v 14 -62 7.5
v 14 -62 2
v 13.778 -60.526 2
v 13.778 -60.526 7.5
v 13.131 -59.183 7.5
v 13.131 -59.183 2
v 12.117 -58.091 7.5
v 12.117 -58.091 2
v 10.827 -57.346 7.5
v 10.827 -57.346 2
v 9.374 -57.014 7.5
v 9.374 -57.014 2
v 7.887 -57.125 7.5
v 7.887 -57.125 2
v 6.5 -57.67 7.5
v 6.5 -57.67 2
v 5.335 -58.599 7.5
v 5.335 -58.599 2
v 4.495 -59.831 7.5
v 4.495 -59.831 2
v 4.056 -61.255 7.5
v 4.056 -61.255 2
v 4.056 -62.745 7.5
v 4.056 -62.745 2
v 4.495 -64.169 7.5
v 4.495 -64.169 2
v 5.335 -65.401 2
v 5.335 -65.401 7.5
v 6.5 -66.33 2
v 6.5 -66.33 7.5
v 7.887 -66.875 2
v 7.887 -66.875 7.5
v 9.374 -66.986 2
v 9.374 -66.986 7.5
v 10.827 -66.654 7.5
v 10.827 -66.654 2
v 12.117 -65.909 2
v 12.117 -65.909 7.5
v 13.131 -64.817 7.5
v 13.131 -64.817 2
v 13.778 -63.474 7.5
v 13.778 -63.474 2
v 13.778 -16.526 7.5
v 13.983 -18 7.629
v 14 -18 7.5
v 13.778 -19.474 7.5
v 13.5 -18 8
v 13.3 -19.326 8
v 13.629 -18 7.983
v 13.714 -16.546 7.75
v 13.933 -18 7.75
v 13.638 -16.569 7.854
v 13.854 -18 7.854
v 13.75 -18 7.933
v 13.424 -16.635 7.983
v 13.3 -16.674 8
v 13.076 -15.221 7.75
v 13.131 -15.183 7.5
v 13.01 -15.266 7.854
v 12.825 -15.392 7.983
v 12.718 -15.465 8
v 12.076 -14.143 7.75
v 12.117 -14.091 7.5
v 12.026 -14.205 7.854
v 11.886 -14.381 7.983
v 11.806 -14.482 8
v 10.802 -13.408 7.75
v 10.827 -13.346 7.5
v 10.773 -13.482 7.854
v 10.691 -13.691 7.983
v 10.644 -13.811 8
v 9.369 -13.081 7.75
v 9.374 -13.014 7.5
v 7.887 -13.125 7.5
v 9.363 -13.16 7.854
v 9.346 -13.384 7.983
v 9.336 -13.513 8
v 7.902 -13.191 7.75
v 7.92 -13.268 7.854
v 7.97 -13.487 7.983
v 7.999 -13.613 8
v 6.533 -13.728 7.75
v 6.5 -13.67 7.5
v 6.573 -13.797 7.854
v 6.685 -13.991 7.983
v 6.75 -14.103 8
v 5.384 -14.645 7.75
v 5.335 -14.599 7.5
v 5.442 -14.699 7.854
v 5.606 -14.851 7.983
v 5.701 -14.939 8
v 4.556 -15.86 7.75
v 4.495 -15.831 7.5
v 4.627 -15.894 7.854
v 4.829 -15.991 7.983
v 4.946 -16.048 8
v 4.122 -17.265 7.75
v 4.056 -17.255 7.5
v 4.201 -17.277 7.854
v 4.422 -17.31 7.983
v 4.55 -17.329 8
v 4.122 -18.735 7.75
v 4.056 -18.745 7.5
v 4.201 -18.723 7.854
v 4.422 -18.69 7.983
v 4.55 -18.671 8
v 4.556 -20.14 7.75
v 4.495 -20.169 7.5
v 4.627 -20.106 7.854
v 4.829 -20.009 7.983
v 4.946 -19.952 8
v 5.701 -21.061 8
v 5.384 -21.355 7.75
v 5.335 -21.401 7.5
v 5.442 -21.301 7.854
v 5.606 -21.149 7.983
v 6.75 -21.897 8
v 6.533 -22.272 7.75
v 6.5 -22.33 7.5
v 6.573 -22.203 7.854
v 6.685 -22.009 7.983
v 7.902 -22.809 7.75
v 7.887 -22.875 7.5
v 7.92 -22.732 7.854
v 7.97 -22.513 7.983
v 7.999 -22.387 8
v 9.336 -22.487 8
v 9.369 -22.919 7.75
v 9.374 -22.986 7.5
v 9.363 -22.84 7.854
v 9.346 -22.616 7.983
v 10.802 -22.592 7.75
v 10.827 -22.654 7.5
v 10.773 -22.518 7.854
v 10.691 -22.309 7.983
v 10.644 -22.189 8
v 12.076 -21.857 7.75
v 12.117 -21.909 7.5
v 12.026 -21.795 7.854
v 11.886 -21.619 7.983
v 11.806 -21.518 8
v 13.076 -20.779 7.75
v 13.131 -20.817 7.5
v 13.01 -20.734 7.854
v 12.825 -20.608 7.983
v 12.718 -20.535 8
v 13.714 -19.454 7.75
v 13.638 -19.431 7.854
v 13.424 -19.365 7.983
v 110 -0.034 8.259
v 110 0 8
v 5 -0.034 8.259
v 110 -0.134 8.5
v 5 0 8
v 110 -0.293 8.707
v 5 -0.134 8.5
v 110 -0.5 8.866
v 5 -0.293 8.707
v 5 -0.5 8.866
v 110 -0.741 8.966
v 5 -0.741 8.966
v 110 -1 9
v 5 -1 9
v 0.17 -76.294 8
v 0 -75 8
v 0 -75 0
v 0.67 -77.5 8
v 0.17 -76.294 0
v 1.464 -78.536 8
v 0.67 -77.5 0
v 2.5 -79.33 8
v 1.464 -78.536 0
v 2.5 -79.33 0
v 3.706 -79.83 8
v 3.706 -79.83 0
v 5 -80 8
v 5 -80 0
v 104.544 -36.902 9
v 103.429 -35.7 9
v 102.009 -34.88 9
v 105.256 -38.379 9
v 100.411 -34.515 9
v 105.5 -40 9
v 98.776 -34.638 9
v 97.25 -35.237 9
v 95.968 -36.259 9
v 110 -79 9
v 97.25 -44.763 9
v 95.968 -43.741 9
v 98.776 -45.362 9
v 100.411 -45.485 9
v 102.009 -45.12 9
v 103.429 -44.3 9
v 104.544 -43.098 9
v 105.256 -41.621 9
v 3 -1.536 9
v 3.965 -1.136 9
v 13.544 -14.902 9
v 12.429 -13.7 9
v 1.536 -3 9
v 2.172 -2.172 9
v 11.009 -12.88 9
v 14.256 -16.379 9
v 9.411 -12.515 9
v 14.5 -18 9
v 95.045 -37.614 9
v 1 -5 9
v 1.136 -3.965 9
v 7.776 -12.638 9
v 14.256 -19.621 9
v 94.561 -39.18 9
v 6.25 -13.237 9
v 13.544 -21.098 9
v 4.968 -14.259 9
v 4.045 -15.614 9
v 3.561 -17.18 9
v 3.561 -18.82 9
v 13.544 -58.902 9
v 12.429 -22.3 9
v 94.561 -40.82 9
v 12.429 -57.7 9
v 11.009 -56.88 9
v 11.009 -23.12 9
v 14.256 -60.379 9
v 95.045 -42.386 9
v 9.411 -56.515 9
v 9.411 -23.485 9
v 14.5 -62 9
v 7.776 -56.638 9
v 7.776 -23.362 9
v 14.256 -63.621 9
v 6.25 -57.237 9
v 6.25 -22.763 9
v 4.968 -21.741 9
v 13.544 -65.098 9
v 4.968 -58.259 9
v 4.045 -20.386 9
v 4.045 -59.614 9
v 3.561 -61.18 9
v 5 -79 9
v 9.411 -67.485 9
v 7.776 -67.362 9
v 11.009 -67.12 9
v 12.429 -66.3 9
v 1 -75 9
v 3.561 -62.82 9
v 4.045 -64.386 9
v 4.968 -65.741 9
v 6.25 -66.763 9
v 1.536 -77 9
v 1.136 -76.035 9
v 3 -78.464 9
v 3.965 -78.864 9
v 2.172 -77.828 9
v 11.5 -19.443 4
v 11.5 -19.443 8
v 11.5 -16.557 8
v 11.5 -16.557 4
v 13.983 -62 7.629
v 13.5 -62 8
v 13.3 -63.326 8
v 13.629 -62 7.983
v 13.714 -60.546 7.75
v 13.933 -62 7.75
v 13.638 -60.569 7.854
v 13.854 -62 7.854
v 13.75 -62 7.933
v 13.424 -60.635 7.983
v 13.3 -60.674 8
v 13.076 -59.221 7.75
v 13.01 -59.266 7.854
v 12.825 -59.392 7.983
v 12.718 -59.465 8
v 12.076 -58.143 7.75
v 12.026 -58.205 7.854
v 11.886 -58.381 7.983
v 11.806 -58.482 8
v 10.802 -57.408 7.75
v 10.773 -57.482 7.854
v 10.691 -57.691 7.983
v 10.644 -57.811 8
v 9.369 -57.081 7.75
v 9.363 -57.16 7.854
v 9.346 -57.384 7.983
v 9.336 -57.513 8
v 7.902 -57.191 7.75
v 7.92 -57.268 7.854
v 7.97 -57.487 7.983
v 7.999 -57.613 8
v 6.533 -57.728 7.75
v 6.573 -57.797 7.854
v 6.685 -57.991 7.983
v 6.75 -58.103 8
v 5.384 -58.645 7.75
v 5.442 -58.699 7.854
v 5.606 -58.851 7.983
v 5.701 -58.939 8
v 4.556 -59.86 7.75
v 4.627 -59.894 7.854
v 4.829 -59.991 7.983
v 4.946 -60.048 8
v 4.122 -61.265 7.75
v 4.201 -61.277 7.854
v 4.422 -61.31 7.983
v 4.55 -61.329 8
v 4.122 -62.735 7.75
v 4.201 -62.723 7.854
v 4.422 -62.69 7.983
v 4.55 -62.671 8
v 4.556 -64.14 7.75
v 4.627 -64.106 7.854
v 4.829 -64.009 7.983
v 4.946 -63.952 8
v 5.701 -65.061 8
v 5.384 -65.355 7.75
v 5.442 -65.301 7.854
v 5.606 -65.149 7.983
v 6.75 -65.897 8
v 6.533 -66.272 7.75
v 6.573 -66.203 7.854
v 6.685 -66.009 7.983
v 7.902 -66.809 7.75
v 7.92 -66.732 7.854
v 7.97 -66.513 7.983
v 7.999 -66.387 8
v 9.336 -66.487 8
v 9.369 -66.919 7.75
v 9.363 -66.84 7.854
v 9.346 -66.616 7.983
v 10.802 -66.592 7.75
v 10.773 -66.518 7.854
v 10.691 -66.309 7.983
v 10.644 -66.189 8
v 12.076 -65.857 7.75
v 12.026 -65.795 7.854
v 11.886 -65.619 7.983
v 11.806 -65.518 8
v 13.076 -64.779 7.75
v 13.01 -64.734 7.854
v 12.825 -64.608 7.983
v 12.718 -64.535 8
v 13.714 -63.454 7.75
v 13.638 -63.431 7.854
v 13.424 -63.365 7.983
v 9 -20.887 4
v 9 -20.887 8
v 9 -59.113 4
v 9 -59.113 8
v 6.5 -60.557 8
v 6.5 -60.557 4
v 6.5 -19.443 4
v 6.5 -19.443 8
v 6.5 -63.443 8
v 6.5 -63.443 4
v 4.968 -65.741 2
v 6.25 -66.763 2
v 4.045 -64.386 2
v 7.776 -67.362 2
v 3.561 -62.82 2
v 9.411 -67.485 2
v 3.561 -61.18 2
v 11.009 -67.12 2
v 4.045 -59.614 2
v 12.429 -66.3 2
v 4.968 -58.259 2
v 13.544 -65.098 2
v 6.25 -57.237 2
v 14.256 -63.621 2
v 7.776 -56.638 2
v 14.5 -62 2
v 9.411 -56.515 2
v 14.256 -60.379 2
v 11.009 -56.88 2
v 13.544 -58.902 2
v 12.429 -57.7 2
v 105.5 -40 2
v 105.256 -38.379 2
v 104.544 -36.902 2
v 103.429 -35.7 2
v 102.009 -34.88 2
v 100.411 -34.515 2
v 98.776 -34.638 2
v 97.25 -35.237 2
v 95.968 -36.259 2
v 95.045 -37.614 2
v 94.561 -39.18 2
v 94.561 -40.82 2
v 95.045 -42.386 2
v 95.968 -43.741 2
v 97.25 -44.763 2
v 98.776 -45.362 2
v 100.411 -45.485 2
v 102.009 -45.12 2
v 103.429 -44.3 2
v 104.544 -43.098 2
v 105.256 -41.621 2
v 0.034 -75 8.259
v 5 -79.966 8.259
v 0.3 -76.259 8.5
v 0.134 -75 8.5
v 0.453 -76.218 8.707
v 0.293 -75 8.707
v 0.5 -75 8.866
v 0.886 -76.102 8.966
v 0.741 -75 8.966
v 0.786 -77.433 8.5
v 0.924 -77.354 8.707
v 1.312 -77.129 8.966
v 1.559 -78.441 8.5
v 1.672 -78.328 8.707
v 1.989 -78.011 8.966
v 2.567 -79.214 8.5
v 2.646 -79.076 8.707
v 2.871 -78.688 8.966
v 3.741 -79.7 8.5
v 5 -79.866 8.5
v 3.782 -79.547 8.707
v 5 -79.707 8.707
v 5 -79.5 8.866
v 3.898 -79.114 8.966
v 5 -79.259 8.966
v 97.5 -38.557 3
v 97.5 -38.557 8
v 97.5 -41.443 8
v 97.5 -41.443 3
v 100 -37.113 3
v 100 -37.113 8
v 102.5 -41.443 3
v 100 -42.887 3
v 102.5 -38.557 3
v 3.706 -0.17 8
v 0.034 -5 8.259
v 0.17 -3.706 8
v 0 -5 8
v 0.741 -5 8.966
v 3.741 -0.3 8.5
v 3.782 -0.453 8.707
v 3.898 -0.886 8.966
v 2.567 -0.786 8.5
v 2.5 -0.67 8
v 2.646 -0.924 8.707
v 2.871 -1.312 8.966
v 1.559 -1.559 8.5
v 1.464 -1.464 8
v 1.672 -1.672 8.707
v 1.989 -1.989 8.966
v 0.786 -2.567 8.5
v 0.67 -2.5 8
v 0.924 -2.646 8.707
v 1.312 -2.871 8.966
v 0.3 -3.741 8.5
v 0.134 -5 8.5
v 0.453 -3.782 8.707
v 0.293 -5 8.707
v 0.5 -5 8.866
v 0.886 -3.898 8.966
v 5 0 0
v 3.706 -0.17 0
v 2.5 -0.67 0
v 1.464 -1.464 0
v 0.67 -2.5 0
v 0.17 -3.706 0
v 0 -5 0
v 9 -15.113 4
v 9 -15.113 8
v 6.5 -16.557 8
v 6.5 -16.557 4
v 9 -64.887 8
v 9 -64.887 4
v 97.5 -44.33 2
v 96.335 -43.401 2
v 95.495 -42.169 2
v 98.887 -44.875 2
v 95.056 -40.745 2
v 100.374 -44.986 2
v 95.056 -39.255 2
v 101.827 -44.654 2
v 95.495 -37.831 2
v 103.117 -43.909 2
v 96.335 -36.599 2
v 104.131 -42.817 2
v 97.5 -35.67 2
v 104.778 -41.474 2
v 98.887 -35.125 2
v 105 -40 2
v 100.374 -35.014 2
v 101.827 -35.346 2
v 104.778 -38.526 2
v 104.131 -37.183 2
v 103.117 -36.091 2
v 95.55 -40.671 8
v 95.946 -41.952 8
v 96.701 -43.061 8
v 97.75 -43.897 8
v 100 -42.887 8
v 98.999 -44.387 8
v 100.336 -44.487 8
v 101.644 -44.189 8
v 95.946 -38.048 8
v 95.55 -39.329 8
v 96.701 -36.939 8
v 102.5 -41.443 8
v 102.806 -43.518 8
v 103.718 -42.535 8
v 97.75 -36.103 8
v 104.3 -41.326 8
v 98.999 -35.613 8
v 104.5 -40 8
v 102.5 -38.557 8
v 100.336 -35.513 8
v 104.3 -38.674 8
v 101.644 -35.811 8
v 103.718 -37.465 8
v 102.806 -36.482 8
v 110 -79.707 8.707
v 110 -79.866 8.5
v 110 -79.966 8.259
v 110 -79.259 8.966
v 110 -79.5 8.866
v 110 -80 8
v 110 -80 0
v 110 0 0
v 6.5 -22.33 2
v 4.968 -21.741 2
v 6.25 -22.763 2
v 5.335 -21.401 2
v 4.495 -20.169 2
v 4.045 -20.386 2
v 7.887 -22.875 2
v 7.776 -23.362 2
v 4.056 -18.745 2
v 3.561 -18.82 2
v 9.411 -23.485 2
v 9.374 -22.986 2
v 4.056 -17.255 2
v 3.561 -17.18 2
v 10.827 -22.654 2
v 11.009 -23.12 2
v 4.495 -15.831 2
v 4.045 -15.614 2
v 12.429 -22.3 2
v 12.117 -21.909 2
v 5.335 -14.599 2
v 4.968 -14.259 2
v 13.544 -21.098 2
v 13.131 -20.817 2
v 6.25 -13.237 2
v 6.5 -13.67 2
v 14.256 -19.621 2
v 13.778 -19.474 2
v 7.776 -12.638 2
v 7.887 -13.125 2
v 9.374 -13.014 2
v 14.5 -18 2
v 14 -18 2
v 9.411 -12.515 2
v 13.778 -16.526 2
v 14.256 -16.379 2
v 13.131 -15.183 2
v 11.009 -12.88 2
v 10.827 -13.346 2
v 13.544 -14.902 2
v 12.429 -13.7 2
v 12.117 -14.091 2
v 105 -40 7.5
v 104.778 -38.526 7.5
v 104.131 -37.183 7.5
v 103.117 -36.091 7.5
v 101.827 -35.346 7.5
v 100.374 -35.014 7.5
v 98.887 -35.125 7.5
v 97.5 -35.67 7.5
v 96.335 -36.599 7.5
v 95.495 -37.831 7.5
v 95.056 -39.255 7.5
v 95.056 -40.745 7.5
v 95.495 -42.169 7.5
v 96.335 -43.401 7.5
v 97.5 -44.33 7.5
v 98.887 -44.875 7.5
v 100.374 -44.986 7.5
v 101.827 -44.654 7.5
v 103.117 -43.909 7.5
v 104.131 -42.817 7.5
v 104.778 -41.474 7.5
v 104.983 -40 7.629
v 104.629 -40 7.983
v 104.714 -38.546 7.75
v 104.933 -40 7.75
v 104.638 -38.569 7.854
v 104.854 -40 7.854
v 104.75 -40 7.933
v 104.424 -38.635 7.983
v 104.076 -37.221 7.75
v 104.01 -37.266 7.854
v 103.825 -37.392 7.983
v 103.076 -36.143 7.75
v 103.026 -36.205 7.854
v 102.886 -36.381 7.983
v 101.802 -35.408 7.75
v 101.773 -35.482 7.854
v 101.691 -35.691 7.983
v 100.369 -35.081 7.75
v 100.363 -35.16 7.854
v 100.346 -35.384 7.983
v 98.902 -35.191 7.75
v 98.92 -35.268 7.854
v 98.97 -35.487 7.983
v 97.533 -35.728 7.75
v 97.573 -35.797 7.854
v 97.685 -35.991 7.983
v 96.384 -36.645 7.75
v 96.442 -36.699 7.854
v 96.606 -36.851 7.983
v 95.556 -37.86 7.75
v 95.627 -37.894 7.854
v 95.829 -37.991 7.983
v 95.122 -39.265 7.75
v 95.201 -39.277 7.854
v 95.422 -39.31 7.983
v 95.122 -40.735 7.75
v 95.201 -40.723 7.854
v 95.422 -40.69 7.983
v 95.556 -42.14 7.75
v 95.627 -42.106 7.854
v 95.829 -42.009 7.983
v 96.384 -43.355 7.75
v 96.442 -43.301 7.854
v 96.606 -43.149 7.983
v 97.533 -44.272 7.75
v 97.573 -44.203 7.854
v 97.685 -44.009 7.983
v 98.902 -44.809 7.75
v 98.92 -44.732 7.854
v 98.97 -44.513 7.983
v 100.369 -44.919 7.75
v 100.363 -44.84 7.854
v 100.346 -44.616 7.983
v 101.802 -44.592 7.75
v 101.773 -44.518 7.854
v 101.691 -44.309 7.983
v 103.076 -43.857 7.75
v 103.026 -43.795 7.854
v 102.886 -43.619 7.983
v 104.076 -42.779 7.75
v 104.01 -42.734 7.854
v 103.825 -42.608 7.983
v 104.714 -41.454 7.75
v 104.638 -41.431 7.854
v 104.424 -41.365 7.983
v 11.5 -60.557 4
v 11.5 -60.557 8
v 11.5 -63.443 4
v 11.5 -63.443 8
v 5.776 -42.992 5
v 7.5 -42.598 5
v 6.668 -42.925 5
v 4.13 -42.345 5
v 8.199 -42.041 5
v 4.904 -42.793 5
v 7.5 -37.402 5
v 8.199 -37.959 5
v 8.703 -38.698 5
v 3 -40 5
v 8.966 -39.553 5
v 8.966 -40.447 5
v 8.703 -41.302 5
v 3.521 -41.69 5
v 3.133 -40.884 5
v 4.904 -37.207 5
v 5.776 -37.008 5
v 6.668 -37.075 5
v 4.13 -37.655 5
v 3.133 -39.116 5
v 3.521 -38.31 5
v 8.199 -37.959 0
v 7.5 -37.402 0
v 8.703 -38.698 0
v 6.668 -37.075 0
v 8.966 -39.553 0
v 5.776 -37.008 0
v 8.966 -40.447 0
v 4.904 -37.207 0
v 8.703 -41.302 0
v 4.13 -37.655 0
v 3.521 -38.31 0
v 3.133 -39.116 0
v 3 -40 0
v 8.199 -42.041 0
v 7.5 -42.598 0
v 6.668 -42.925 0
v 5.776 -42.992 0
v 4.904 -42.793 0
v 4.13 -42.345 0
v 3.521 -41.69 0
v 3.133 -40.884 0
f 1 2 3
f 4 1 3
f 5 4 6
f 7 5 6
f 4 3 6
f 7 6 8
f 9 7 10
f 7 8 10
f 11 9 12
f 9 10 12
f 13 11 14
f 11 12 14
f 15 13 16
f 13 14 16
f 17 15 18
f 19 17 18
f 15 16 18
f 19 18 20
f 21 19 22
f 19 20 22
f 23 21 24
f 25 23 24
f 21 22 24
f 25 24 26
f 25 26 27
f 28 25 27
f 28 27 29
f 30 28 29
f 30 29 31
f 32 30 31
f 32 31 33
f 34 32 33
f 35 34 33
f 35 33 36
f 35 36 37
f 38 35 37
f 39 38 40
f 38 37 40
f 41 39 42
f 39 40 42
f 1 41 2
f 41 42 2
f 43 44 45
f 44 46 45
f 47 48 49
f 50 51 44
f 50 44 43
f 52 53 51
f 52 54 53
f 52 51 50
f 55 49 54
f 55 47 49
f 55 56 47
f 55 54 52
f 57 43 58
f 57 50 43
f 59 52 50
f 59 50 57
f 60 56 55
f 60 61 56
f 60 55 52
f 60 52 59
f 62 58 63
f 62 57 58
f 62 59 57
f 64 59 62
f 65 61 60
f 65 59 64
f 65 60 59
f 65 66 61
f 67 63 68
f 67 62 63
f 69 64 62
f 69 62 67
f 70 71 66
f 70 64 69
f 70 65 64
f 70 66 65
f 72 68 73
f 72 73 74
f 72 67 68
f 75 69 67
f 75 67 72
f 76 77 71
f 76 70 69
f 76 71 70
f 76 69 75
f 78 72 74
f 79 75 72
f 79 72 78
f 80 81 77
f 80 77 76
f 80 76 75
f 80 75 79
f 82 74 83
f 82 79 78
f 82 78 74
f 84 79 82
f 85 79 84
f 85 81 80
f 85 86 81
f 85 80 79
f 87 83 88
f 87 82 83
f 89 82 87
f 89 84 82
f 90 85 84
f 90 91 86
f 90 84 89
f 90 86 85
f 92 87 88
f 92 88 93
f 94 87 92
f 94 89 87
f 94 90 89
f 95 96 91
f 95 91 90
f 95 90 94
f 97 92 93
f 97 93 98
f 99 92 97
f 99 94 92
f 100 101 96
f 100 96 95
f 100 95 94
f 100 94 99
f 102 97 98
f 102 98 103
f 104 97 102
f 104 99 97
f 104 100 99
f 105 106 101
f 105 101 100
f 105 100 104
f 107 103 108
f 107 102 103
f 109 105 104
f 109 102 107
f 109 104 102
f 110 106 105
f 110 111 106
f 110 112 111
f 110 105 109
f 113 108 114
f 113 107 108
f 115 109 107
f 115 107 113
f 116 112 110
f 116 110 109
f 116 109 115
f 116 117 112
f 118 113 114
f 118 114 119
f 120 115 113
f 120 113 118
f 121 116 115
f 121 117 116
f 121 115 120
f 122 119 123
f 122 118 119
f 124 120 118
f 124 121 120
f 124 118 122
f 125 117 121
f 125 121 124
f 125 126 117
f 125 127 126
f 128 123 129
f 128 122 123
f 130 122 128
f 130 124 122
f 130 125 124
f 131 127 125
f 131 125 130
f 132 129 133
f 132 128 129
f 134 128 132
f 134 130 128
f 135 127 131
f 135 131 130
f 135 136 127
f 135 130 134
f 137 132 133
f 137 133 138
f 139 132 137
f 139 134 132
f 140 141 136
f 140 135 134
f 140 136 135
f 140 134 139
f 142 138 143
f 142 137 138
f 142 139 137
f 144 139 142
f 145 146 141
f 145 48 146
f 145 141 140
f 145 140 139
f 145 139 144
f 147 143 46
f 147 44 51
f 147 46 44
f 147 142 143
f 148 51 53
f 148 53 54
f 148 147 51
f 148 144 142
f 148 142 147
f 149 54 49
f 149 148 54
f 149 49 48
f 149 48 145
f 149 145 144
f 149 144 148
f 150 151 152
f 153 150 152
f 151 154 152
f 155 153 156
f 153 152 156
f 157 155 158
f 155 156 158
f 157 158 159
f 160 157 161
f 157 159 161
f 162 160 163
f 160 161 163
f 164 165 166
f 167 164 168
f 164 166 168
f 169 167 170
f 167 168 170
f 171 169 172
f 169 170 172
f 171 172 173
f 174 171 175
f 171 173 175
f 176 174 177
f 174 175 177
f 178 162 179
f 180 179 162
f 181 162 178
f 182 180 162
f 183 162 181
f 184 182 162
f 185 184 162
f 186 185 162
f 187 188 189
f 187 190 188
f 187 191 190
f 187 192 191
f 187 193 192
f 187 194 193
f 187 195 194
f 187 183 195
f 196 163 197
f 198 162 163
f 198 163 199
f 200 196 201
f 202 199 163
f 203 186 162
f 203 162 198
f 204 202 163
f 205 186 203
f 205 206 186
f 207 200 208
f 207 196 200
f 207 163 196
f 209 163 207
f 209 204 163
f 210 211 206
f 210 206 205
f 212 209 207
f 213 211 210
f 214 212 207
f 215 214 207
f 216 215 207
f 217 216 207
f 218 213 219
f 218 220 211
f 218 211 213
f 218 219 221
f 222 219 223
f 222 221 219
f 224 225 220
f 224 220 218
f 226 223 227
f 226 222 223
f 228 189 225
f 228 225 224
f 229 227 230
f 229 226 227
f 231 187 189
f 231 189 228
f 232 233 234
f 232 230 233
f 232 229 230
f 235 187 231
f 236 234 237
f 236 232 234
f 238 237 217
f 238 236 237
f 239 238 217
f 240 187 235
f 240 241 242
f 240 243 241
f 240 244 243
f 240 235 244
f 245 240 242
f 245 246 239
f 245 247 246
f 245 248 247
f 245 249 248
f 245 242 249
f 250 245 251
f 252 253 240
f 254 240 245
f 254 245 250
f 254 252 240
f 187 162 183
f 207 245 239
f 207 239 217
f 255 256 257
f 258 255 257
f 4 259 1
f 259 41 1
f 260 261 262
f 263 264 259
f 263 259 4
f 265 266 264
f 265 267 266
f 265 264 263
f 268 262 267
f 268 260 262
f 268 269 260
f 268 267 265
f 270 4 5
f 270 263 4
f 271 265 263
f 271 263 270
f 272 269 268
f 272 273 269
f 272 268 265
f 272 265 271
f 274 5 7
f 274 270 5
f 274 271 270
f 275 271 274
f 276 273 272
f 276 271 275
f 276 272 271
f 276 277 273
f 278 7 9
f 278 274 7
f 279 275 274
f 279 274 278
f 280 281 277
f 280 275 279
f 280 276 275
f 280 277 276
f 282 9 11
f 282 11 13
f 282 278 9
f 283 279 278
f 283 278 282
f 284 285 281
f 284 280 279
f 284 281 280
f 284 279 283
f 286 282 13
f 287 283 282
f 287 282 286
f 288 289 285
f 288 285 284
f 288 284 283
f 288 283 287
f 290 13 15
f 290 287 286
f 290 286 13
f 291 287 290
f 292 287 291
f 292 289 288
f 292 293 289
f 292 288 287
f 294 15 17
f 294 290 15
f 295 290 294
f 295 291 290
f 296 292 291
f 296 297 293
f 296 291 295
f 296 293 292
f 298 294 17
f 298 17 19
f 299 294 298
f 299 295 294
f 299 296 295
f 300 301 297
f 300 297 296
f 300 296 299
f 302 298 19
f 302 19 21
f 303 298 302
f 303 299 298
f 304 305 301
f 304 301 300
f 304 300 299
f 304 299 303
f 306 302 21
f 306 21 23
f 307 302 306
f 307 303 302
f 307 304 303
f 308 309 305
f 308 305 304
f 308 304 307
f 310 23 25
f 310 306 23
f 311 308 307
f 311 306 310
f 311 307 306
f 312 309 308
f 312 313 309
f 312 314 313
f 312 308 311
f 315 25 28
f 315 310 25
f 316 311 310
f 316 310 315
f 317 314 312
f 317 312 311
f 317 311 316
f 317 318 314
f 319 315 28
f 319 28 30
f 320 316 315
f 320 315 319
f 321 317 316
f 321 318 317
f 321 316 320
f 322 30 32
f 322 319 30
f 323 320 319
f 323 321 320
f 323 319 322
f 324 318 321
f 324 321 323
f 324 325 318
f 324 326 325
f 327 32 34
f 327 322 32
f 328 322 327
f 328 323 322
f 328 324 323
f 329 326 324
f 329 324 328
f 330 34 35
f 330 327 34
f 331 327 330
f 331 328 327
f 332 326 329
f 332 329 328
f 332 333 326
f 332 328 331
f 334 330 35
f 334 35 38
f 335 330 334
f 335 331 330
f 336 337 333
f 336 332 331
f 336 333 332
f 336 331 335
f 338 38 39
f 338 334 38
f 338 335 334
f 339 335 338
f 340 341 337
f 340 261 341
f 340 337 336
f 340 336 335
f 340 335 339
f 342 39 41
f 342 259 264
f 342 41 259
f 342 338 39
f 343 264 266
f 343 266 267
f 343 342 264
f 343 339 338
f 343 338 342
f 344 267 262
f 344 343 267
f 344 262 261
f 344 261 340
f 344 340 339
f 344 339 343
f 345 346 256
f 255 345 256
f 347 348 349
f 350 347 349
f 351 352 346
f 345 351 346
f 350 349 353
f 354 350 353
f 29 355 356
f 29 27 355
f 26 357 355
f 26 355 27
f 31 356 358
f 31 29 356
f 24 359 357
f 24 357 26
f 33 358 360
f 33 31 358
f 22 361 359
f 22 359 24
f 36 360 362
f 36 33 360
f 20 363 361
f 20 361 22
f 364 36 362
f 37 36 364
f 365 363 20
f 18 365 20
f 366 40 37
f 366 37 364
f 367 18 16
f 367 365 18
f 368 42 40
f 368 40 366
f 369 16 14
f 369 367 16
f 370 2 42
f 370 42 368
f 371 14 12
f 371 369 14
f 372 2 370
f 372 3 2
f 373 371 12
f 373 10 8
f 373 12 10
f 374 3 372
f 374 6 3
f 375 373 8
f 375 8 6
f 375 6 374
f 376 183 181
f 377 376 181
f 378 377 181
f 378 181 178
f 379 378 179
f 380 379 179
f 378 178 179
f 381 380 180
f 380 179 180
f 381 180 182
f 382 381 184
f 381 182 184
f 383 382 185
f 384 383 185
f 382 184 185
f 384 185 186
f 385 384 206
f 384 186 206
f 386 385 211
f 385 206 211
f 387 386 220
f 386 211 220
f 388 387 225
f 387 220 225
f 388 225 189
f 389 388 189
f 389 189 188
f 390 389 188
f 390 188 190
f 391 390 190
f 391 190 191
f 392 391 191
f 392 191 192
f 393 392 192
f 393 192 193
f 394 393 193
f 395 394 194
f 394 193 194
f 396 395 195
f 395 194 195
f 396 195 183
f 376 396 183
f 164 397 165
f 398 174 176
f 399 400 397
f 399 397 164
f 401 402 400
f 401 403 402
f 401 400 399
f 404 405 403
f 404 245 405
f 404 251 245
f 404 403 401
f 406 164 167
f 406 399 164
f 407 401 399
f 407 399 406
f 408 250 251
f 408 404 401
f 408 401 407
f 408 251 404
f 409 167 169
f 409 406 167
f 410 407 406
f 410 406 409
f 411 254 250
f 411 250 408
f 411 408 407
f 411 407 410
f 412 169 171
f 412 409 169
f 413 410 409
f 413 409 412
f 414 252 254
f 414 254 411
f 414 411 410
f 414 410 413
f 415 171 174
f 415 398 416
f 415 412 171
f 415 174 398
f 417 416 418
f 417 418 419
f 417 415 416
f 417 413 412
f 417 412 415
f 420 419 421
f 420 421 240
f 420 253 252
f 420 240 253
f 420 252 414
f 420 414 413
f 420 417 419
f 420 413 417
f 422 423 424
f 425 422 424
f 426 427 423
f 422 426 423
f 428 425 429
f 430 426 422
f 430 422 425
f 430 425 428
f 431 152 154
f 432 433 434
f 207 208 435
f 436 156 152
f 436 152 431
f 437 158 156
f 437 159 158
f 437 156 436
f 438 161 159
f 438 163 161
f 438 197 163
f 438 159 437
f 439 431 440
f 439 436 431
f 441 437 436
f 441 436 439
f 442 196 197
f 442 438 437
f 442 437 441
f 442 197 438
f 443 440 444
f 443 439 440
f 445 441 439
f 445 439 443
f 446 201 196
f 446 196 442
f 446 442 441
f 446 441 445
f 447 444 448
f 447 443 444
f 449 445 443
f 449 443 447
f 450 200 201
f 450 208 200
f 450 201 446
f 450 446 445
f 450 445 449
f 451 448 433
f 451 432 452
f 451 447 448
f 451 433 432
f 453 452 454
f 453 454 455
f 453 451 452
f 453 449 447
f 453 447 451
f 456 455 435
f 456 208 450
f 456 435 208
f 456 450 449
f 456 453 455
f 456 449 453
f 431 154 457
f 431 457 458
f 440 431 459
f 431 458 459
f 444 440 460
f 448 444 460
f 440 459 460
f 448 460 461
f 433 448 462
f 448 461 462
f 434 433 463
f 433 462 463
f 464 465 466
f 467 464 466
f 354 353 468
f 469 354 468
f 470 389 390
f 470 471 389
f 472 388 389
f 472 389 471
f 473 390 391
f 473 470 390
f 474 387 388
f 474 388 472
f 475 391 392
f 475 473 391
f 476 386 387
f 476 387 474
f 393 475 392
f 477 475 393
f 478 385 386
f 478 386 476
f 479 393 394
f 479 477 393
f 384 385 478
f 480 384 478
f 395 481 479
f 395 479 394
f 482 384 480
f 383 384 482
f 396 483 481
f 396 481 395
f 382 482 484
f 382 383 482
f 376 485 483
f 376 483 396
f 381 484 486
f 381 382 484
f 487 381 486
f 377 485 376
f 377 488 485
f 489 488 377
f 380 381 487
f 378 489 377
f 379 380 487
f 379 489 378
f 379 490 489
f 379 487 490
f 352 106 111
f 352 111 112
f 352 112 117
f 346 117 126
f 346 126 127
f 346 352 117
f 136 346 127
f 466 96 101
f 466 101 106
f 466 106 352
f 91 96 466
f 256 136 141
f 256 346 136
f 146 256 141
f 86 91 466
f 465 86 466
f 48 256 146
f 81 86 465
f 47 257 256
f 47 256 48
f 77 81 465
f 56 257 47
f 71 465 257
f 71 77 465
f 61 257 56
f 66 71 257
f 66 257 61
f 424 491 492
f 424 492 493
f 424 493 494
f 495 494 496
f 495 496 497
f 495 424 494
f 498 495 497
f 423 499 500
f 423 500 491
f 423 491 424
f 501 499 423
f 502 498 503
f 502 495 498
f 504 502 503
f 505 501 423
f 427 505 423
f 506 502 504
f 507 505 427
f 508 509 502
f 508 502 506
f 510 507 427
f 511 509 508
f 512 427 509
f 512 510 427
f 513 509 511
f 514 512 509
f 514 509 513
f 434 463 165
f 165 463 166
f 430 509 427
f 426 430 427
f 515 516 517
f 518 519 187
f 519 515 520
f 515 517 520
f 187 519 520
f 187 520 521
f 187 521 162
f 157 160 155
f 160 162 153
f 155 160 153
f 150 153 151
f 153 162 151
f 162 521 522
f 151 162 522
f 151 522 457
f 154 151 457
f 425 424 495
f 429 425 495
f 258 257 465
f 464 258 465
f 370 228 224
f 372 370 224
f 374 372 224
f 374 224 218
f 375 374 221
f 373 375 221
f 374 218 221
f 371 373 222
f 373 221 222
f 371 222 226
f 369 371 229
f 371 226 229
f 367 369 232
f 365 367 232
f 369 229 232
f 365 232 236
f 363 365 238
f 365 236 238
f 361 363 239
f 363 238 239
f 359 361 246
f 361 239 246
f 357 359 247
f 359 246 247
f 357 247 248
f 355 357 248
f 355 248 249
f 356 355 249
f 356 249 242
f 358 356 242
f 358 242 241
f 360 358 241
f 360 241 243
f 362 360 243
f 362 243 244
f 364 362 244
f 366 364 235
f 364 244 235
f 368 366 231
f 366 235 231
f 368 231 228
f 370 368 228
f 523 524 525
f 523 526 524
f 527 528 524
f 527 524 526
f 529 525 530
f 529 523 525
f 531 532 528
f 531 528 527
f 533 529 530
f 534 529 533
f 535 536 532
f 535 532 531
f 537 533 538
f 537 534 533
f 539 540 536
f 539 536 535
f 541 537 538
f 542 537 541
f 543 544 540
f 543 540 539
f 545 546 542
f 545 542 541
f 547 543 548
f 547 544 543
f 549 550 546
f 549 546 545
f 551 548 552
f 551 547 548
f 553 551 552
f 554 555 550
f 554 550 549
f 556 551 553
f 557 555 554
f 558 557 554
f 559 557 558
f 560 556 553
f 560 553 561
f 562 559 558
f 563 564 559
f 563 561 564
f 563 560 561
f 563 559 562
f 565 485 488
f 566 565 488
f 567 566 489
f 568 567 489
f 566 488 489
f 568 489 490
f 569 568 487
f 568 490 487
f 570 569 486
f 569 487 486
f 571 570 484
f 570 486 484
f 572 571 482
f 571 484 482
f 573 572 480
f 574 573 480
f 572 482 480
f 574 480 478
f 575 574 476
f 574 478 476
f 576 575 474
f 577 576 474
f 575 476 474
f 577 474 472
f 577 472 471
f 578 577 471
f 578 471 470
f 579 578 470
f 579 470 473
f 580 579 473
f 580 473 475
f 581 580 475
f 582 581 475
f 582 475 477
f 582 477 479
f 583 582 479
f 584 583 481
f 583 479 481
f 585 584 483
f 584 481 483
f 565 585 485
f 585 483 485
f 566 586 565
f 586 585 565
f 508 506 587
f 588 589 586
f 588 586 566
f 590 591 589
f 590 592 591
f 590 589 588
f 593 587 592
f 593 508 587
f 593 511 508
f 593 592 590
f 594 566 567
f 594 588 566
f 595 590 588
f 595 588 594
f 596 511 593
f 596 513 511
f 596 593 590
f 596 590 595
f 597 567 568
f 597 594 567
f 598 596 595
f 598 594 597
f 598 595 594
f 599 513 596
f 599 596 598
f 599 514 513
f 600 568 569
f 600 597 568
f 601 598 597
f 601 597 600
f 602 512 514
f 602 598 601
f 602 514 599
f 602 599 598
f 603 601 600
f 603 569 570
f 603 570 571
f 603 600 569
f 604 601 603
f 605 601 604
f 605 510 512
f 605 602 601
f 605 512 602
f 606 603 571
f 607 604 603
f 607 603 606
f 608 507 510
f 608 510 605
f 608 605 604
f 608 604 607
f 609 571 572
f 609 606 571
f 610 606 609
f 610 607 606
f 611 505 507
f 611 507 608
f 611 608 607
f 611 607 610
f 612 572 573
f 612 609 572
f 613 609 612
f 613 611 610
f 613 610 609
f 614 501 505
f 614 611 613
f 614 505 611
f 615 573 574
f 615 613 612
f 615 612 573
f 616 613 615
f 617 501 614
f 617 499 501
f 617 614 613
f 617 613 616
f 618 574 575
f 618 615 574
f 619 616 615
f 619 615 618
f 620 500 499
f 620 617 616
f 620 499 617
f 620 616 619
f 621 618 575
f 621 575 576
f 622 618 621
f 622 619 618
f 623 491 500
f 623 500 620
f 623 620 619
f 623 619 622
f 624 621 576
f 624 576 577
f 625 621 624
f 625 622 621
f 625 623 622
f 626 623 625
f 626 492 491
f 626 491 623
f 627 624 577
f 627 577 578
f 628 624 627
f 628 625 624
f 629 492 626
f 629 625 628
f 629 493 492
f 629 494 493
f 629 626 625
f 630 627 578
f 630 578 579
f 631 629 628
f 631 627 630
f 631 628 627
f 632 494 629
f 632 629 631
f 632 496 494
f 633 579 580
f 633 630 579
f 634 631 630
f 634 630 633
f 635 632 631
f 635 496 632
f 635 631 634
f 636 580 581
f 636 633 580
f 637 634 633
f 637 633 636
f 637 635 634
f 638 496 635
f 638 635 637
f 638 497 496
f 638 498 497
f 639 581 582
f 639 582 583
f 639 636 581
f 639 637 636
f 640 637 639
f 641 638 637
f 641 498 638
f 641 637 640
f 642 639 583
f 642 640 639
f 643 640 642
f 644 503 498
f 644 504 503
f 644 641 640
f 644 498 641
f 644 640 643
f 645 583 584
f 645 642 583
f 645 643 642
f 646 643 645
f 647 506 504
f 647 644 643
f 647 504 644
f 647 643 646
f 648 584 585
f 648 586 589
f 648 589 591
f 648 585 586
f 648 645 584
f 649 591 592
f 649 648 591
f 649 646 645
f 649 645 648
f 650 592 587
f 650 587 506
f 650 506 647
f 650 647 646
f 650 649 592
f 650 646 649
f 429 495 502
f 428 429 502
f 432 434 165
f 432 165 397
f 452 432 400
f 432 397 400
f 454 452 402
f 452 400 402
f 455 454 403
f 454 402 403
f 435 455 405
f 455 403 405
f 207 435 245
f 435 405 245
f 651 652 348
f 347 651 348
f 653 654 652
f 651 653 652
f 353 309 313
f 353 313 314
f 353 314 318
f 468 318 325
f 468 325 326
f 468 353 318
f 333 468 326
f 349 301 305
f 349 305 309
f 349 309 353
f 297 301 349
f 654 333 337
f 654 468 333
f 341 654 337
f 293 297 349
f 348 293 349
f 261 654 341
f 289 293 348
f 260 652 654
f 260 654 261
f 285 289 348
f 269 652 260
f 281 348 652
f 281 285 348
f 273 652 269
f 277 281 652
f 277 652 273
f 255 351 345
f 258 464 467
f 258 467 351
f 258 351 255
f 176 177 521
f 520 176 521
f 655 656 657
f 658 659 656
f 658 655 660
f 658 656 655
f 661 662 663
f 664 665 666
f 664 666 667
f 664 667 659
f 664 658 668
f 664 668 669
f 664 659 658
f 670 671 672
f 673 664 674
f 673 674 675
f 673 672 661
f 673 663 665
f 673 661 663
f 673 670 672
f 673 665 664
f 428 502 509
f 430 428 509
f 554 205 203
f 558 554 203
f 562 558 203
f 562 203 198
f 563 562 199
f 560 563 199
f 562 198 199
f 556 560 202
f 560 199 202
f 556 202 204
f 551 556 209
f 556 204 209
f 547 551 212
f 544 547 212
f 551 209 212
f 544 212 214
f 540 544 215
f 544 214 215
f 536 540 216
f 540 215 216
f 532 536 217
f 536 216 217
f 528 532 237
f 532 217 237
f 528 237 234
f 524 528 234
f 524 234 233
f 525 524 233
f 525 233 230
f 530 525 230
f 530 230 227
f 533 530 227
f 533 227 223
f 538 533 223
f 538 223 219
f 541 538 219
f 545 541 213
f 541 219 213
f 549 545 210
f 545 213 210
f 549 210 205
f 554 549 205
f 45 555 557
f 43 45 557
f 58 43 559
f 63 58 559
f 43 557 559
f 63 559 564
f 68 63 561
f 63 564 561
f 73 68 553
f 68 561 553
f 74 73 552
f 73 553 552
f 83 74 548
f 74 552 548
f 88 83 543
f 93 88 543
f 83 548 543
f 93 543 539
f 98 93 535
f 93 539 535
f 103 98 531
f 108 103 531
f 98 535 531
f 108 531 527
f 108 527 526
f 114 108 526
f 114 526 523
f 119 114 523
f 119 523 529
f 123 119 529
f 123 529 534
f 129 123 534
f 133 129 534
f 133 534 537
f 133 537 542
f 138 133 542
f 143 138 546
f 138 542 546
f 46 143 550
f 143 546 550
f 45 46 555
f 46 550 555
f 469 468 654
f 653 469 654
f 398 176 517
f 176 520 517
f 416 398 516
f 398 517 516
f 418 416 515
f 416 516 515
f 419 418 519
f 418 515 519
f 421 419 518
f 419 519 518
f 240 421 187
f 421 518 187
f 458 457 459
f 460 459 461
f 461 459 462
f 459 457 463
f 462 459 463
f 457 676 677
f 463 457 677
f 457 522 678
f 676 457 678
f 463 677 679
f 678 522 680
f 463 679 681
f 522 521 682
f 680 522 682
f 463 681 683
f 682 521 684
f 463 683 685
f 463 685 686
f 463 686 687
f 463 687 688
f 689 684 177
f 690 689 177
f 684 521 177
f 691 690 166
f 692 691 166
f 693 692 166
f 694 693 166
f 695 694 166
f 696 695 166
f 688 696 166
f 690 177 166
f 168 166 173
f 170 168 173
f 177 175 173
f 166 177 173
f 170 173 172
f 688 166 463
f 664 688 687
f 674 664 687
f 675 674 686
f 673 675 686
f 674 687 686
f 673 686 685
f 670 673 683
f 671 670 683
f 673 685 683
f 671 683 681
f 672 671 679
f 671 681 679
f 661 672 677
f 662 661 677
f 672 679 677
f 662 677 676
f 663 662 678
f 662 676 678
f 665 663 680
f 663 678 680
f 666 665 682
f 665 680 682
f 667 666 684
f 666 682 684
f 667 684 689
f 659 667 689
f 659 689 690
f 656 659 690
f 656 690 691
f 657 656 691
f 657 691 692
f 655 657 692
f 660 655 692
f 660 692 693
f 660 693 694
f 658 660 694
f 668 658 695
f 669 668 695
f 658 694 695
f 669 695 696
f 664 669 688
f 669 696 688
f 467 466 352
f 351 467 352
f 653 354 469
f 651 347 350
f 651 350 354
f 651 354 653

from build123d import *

# Parameters (mm, degrees)
BOSS_EXTRU_1_DEPTH               = 9
CONG_1_R                         = 1
ESQUISSE4_R                      = 5.5
ENL_V_MAT_EXTRU_1_DEPTH          = 7
ESQUISSE5_R                      = 5
BOSS_EXTRU_2_DEPTH               = 6
CONG_2_R                         = 0.5
ENL_V_MAT_EXTRU_2_DEPTH          = 4
R_P_TITION_LIN_AIRE1_COUNT       = 2
R_P_TITION_LIN_AIRE1_PITCH       = 44
CONG_2_OF_R_P_TITION_LIN_AIRE1_R = 0.5
ESQUISSE7_R                      = 5.5
ENL_V_MAT_EXTRU_3_DEPTH          = 7
ESQUISSE8_R                      = 5
BOSS_EXTRU_3_DEPTH               = 6
CONG_3_R                         = 0.5
ENL_V_MAT_EXTRU_4_DEPTH          = 5
ESQUISSE10_R                     = 3
ENL_V_MAT_EXTRU_5_DEPTH          = 5


with BuildPart() as part:
    # Esquisse1 → Boss.-Extru.1 (new body)
    with BuildSketch(Plane(origin=(0, 0, 0), x_dir=(-1, 0, 0), z_dir=(0, 0, 1))):
        with BuildLine():
            Line((0, 5), (0, 75))
            ThreePointArc((0, 75), (-1.464466094, 78.535533906), (-5, 80))
            Line((-5, 80), (-110, 80))
            Line((-110, 80), (-110, 0))
            Line((-110, 0), (-5, 0))
            ThreePointArc((-5, 0), (-1.464466094, 1.464466094), (0, 5))
        make_face()
    extrude(amount=BOSS_EXTRU_1_DEPTH)

    # Congé1
    cong_1_edges = [part.edges().sort_by_distance(p)[0] for p in [
        (1.464466094, -78.535533906, 9),
        (57.5, -80, 9),
        (57.5, 0, 9),
        (1.464466094, -1.464466094, 9),
        (0, -40, 9),
    ]]
    fillet(cong_1_edges, radius=CONG_1_R)

    # Esquisse4 → Enlèv. mat.-Extru.1 (cut)
    with BuildSketch(Plane.XY.offset(9)):
        with Locations((9, -18)):
            Circle(ESQUISSE4_R)
    enl_v_mat_extru_1 = extrude(amount=-ENL_V_MAT_EXTRU_1_DEPTH, mode=Mode.SUBTRACT)

    # Esquisse5 → Boss.-Extru.2 (add)
    with BuildSketch(Plane.XY.offset(2)):
        with Locations((9, -18)):
            Circle(ESQUISSE5_R)
    boss_extru_2 = extrude(amount=BOSS_EXTRU_2_DEPTH)

    # Congé2
    cong_2_edges = [part.edges().sort_by_distance(p)[0] for p in [
        (4, -18, 8),
    ]]
    fillet(cong_2_edges, radius=CONG_2_R)

    # Esquisse6 → Enlèv. mat.-Extru.2 (cut)
    with BuildSketch(Plane.XY.offset(8)):
        Polygon((9, -15.113248654), (6.5, -16.556624327), (6.5, -19.443375673), (9, -20.886751346), (11.5, -19.443375673), (11.5, -16.556624327), align=None)
    enl_v_mat_extru_2 = extrude(amount=-ENL_V_MAT_EXTRU_2_DEPTH, mode=Mode.SUBTRACT)

    # Répétition linéaire1: Enlèv. mat.-Extru.1, Boss.-Extru.2, Enlèv. mat.-Extru.2 ×2
    with Locations(*[(0, -i * R_P_TITION_LIN_AIRE1_PITCH, 0) for i in range(1, R_P_TITION_LIN_AIRE1_COUNT)]):
        add(enl_v_mat_extru_1, mode=Mode.SUBTRACT)
        add(boss_extru_2)
        add(enl_v_mat_extru_2, mode=Mode.SUBTRACT)

    # Congé2 of Répétition linéaire1
    cong_2_of_r_p_tition_lin_aire1_edges = [part.edges().sort_by_distance(p)[0] for p in [
        (4, -62, 8),
    ]]
    fillet(cong_2_of_r_p_tition_lin_aire1_edges, radius=CONG_2_OF_R_P_TITION_LIN_AIRE1_R)

    # Esquisse7 → Enlèv. mat.-Extru.3 (cut)
    with BuildSketch(Plane.XY.offset(9)):
        with Locations((100, -40)):
            Circle(ESQUISSE7_R)
    extrude(amount=-ENL_V_MAT_EXTRU_3_DEPTH, mode=Mode.SUBTRACT)

    # Esquisse8 → Boss.-Extru.3 (add)
    with BuildSketch(Plane.XY.offset(2)):
        with Locations((100, -40)):
            Circle(ESQUISSE8_R)
    extrude(amount=BOSS_EXTRU_3_DEPTH)

    # Congé3
    cong_3_edges = [part.edges().sort_by_distance(p)[0] for p in [
        (95, -40, 8),
    ]]
    fillet(cong_3_edges, radius=CONG_3_R)

    # Esquisse9 → Enlèv. mat.-Extru.4 (cut)
    with BuildSketch(Plane.XY.offset(8)):
        Polygon((100, -37.113248654), (97.5, -38.556624327), (97.5, -41.443375673), (100, -42.886751346), (102.5, -41.443375673), (102.5, -38.556624327), align=None)
    extrude(amount=-ENL_V_MAT_EXTRU_4_DEPTH, mode=Mode.SUBTRACT)

    # Esquisse10 → Enlèv. mat.-Extru.5 (cut)
    with BuildSketch(Plane(origin=(0, 0, 0), x_dir=(-1, 0, 0), z_dir=(0, 0, -1))):
        with Locations((-6, -40)):
            Circle(ESQUISSE10_R)
    extrude(amount=-ENL_V_MAT_EXTRU_5_DEPTH, mode=Mode.SUBTRACT)


solid = part.part
